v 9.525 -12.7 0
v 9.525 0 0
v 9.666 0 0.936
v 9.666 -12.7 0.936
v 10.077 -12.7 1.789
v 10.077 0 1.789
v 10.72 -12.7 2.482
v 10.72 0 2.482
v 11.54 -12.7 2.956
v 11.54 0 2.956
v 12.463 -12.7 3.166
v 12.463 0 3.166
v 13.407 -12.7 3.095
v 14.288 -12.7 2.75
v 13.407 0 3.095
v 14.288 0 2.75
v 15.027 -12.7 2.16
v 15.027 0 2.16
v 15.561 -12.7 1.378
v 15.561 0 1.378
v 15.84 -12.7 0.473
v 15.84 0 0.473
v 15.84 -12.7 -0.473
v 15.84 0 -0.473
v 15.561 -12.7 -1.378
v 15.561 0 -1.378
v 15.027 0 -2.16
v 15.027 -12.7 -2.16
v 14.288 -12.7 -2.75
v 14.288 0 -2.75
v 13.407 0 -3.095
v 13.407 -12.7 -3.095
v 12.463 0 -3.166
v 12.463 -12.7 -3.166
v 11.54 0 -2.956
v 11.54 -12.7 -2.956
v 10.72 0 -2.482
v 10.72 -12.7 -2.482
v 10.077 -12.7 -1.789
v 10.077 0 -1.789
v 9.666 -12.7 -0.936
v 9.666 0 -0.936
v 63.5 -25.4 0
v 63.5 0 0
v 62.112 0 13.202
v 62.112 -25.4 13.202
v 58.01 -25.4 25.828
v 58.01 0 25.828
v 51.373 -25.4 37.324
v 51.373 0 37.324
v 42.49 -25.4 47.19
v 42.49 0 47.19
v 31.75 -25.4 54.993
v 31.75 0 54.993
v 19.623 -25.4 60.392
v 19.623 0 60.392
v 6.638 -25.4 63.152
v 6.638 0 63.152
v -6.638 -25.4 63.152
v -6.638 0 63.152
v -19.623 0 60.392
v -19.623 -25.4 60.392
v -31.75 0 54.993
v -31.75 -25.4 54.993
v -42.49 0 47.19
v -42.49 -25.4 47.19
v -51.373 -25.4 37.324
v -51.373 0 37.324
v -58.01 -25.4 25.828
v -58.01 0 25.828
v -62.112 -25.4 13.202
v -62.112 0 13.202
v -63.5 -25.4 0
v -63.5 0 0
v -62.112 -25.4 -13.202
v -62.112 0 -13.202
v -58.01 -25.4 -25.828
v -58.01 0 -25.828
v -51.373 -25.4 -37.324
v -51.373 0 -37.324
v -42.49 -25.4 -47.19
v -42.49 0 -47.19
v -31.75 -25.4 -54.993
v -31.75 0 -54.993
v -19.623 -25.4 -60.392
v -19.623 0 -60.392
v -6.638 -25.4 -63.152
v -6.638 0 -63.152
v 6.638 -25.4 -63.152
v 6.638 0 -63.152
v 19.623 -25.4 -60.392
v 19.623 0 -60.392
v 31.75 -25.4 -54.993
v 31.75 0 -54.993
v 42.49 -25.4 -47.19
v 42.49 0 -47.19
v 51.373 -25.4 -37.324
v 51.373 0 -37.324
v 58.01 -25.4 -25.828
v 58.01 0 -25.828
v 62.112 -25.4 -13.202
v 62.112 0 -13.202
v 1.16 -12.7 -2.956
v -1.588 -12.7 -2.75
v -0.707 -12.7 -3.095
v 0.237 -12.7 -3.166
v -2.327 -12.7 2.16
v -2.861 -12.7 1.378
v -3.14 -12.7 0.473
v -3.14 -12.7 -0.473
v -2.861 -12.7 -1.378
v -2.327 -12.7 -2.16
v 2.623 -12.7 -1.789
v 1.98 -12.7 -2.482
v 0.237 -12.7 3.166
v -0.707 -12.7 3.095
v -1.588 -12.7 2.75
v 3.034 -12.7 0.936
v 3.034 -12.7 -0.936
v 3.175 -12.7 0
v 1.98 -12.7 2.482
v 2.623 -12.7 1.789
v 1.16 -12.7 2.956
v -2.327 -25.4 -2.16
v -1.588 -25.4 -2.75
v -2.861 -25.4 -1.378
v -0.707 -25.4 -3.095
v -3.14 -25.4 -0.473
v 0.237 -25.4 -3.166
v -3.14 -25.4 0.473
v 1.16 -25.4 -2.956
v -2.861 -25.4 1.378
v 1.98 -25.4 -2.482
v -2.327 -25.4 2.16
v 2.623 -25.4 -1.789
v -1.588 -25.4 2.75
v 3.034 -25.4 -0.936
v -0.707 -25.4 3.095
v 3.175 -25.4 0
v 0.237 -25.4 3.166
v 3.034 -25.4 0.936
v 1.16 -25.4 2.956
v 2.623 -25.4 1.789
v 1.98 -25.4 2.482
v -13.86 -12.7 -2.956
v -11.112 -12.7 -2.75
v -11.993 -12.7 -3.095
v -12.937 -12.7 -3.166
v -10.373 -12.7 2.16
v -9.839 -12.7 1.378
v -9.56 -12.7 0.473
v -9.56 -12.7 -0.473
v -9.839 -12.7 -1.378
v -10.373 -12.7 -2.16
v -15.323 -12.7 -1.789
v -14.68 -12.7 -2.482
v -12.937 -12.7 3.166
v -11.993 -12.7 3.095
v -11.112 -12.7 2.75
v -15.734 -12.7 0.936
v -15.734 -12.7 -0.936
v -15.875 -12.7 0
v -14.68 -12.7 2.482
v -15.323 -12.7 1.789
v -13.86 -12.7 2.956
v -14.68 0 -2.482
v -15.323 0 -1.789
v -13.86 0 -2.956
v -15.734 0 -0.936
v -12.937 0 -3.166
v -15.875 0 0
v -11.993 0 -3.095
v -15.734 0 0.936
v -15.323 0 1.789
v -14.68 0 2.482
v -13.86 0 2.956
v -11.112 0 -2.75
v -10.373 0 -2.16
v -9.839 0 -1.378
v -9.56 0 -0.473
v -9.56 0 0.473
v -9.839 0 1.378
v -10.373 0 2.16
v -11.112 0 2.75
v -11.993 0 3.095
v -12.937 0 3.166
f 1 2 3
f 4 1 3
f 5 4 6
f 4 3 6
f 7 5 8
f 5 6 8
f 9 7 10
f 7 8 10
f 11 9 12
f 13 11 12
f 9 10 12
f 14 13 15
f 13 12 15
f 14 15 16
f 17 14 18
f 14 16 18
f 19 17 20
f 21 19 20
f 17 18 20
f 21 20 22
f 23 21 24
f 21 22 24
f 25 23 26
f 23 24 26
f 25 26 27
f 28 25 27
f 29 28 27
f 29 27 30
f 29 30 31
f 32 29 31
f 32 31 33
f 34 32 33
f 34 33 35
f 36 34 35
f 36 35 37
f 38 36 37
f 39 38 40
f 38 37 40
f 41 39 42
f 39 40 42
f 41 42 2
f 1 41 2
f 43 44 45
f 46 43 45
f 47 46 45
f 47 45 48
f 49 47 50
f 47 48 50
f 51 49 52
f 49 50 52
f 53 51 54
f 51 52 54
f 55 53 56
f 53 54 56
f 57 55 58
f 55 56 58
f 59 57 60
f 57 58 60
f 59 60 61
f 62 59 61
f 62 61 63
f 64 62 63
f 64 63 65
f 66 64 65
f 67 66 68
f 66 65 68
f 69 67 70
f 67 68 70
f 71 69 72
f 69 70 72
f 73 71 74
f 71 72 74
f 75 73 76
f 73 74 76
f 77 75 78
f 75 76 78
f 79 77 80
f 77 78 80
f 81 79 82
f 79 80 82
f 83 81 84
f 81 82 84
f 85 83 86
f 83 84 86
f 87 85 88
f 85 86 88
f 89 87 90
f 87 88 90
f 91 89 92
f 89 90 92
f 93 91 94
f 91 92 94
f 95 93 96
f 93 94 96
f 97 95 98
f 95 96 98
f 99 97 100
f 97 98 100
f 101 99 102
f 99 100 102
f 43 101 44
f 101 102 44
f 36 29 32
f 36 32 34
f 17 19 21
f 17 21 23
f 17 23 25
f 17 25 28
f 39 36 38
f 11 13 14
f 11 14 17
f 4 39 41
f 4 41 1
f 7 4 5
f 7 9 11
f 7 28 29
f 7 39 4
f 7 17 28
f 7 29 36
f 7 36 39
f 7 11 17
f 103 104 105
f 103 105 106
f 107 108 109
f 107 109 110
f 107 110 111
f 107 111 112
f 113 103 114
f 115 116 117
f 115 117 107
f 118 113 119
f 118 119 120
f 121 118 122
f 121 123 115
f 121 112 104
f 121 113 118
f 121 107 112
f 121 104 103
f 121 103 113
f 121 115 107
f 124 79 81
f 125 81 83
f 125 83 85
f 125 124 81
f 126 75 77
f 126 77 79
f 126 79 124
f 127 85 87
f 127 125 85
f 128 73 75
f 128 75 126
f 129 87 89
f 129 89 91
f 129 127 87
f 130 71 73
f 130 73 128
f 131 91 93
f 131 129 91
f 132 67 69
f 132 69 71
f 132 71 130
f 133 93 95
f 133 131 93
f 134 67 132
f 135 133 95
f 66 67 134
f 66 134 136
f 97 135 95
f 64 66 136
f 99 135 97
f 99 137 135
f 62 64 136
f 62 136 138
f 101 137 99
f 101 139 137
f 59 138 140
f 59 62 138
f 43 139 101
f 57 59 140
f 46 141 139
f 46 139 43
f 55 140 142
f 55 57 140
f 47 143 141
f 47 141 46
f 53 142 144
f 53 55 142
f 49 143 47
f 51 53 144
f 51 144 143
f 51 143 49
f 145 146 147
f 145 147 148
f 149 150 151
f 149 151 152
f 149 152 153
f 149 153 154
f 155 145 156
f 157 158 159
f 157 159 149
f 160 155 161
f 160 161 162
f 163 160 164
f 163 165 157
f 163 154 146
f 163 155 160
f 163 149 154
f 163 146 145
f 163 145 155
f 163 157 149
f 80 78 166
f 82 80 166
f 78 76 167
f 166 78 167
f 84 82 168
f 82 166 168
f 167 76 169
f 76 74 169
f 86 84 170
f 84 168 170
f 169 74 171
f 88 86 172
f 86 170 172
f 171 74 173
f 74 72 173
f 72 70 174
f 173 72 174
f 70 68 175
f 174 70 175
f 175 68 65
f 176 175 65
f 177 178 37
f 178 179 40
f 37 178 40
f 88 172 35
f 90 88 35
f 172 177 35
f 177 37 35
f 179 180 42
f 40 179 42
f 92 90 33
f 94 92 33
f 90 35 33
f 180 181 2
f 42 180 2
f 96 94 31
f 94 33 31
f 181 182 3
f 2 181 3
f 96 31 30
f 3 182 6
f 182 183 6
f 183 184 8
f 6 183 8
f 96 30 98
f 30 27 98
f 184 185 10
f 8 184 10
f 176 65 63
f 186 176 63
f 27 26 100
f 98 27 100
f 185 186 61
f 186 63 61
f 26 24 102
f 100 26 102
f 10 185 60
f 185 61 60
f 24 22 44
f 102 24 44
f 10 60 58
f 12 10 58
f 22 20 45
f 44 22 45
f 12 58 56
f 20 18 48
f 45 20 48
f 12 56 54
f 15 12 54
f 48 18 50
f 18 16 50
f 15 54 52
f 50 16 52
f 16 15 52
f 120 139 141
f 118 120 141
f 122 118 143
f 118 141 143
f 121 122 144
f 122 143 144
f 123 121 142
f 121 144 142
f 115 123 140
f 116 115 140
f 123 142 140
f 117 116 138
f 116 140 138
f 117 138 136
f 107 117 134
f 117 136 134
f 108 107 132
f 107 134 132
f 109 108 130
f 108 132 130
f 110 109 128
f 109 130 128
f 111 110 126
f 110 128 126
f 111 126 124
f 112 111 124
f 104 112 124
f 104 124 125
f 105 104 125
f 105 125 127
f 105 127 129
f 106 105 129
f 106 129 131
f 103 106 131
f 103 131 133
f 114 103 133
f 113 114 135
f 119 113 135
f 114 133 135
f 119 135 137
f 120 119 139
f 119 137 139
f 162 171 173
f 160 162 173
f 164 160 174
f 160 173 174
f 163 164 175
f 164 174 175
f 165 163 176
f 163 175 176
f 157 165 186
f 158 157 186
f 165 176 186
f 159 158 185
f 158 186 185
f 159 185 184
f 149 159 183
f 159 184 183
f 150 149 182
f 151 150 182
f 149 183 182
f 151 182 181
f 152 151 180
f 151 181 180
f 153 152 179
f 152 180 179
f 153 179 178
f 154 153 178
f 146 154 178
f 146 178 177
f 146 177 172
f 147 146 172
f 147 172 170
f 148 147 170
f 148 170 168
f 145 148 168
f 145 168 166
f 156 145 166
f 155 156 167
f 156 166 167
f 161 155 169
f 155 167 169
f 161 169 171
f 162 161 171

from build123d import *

# Parameters (mm, degrees)
F0_R     = 63.5
F1_DEPTH = 25.4
F4_R     = 3.175
F5_DEPTH = 12.7
F6_R     = 3.175
F7_DEPTH = 12.7


with BuildPart() as f1:
    # F0 (on Front) → F1 (new body)
    with BuildSketch(Plane.XZ):
        Circle(F0_R)
    extrude(amount=F1_DEPTH)

    # F4 (on face) → F5 (cut)
    with BuildSketch(Plane.XZ.offset(25.4)):
        Circle(F4_R)
    extrude(amount=-F5_DEPTH, mode=Mode.SUBTRACT)

    # F6 (on face) → F7 (cut)
    with BuildSketch(Plane(origin=(0, 0, 0), x_dir=(-1, 0, 0), z_dir=(0, 1, 0))):
        with Locations((-12.7, 0)):
            Circle(F6_R)
        with Locations((12.7, 0)):
            Circle(F6_R)
    extrude(amount=-F7_DEPTH, mode=Mode.SUBTRACT)


solid = f1.part
